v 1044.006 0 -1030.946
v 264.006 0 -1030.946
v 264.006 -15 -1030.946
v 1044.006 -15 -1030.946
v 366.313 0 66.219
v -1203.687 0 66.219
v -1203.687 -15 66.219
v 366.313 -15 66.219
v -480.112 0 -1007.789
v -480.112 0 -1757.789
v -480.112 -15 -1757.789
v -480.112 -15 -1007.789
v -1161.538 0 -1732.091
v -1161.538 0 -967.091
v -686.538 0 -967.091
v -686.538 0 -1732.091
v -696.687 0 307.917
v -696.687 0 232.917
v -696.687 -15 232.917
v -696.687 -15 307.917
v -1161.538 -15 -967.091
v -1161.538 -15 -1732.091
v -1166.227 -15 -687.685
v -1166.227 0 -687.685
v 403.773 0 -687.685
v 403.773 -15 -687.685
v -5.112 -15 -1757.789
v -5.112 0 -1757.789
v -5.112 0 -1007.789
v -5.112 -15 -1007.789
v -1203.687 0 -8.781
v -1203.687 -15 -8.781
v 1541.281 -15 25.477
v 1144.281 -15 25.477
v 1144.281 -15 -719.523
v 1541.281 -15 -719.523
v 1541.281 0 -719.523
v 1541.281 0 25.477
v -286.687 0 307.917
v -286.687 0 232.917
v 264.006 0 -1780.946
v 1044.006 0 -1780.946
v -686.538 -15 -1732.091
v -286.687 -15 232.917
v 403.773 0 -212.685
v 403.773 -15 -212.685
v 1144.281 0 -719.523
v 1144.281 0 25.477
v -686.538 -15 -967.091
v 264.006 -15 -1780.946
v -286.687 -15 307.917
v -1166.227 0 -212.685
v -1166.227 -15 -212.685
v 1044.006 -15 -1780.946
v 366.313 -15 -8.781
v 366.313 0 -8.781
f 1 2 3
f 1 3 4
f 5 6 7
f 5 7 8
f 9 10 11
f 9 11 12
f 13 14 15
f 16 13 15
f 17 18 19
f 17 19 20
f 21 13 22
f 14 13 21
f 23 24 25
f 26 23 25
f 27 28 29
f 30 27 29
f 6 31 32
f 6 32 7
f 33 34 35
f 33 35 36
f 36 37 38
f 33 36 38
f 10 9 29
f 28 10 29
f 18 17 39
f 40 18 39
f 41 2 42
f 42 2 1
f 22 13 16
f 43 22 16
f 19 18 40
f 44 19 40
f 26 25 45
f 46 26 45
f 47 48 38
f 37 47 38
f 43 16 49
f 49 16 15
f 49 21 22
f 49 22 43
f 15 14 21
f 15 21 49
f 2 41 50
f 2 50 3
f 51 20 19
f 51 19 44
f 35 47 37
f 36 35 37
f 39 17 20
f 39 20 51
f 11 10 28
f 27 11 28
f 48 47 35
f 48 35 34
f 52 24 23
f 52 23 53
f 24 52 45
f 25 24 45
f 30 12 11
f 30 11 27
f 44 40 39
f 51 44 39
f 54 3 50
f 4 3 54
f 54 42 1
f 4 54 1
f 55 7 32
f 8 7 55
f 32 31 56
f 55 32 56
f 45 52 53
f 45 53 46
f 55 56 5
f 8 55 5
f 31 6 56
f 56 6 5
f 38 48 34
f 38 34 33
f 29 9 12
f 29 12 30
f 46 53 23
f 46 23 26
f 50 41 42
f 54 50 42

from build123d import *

# Parameters (mm, degrees)
F0_W      = 1570
F0_H      = 75
F1_DEPTH  = 15
F2_W      = 1570
F2_H      = 475
F3_DEPTH  = 15
F4_W      = 475
F4_H      = 765
F5_DEPTH  = 15
F6_W      = 410
F6_H      = 75
F7_DEPTH  = 15
F8_W      = 475
F8_H      = 750
F9_DEPTH  = 15
F10_W     = 780
F10_H     = 750
F11_DEPTH = 15
F12_W     = 397
F12_H     = 745
F13_DEPTH = 15


with BuildPart() as f1:
    # F0 (on Front) → F1 (new body)
    with BuildSketch(Plane.XZ):
        with Locations((-418.687045, 28.718525)):
            Rectangle(F0_W, F0_H)
    extrude(amount=F1_DEPTH)


with BuildPart() as f3:
    # F2 (on Front) → F3 (new body)
    with BuildSketch(Plane.XZ):
        with Locations((-381.22702, -450.18549)):
            Rectangle(F2_W, F2_H)
    extrude(amount=F3_DEPTH)


with BuildPart() as f5:
    # F4 (on Front) → F5 (new body)
    with BuildSketch(Plane.XZ):
        with Locations((-924.037862, -1349.59095)):
            Rectangle(F4_W, F4_H)
    extrude(amount=F5_DEPTH)


with BuildPart() as f7:
    # F6 (on Front) → F7 (new body)
    with BuildSketch(Plane.XZ):
        with Locations((-491.687016, 270.416832)):
            Rectangle(F6_W, F6_H)
    extrude(amount=F7_DEPTH)


with BuildPart() as f9:
    # F8 (on Front) → F9 (new body)
    with BuildSketch(Plane.XZ):
        with Locations((-242.612016, -1382.789493)):
            Rectangle(F8_W, F8_H)
    extrude(amount=F9_DEPTH)


with BuildPart() as f11:
    # F10 (on Front) → F11 (new body)
    with BuildSketch(Plane.XZ):
        with Locations((654.006406, -1405.945539)):
            Rectangle(F10_W, F10_H)
    extrude(amount=F11_DEPTH)


with BuildPart() as f13:
    # F12 (on Front) → F13 (new body)
    with BuildSketch(Plane.XZ):
        with Locations((1342.781249, -347.023013)):
            Rectangle(F12_W, F12_H)
    extrude(amount=F13_DEPTH)


solid = Compound([f1.part, f3.part, f5.part, f7.part, f9.part, f11.part, f13.part])
